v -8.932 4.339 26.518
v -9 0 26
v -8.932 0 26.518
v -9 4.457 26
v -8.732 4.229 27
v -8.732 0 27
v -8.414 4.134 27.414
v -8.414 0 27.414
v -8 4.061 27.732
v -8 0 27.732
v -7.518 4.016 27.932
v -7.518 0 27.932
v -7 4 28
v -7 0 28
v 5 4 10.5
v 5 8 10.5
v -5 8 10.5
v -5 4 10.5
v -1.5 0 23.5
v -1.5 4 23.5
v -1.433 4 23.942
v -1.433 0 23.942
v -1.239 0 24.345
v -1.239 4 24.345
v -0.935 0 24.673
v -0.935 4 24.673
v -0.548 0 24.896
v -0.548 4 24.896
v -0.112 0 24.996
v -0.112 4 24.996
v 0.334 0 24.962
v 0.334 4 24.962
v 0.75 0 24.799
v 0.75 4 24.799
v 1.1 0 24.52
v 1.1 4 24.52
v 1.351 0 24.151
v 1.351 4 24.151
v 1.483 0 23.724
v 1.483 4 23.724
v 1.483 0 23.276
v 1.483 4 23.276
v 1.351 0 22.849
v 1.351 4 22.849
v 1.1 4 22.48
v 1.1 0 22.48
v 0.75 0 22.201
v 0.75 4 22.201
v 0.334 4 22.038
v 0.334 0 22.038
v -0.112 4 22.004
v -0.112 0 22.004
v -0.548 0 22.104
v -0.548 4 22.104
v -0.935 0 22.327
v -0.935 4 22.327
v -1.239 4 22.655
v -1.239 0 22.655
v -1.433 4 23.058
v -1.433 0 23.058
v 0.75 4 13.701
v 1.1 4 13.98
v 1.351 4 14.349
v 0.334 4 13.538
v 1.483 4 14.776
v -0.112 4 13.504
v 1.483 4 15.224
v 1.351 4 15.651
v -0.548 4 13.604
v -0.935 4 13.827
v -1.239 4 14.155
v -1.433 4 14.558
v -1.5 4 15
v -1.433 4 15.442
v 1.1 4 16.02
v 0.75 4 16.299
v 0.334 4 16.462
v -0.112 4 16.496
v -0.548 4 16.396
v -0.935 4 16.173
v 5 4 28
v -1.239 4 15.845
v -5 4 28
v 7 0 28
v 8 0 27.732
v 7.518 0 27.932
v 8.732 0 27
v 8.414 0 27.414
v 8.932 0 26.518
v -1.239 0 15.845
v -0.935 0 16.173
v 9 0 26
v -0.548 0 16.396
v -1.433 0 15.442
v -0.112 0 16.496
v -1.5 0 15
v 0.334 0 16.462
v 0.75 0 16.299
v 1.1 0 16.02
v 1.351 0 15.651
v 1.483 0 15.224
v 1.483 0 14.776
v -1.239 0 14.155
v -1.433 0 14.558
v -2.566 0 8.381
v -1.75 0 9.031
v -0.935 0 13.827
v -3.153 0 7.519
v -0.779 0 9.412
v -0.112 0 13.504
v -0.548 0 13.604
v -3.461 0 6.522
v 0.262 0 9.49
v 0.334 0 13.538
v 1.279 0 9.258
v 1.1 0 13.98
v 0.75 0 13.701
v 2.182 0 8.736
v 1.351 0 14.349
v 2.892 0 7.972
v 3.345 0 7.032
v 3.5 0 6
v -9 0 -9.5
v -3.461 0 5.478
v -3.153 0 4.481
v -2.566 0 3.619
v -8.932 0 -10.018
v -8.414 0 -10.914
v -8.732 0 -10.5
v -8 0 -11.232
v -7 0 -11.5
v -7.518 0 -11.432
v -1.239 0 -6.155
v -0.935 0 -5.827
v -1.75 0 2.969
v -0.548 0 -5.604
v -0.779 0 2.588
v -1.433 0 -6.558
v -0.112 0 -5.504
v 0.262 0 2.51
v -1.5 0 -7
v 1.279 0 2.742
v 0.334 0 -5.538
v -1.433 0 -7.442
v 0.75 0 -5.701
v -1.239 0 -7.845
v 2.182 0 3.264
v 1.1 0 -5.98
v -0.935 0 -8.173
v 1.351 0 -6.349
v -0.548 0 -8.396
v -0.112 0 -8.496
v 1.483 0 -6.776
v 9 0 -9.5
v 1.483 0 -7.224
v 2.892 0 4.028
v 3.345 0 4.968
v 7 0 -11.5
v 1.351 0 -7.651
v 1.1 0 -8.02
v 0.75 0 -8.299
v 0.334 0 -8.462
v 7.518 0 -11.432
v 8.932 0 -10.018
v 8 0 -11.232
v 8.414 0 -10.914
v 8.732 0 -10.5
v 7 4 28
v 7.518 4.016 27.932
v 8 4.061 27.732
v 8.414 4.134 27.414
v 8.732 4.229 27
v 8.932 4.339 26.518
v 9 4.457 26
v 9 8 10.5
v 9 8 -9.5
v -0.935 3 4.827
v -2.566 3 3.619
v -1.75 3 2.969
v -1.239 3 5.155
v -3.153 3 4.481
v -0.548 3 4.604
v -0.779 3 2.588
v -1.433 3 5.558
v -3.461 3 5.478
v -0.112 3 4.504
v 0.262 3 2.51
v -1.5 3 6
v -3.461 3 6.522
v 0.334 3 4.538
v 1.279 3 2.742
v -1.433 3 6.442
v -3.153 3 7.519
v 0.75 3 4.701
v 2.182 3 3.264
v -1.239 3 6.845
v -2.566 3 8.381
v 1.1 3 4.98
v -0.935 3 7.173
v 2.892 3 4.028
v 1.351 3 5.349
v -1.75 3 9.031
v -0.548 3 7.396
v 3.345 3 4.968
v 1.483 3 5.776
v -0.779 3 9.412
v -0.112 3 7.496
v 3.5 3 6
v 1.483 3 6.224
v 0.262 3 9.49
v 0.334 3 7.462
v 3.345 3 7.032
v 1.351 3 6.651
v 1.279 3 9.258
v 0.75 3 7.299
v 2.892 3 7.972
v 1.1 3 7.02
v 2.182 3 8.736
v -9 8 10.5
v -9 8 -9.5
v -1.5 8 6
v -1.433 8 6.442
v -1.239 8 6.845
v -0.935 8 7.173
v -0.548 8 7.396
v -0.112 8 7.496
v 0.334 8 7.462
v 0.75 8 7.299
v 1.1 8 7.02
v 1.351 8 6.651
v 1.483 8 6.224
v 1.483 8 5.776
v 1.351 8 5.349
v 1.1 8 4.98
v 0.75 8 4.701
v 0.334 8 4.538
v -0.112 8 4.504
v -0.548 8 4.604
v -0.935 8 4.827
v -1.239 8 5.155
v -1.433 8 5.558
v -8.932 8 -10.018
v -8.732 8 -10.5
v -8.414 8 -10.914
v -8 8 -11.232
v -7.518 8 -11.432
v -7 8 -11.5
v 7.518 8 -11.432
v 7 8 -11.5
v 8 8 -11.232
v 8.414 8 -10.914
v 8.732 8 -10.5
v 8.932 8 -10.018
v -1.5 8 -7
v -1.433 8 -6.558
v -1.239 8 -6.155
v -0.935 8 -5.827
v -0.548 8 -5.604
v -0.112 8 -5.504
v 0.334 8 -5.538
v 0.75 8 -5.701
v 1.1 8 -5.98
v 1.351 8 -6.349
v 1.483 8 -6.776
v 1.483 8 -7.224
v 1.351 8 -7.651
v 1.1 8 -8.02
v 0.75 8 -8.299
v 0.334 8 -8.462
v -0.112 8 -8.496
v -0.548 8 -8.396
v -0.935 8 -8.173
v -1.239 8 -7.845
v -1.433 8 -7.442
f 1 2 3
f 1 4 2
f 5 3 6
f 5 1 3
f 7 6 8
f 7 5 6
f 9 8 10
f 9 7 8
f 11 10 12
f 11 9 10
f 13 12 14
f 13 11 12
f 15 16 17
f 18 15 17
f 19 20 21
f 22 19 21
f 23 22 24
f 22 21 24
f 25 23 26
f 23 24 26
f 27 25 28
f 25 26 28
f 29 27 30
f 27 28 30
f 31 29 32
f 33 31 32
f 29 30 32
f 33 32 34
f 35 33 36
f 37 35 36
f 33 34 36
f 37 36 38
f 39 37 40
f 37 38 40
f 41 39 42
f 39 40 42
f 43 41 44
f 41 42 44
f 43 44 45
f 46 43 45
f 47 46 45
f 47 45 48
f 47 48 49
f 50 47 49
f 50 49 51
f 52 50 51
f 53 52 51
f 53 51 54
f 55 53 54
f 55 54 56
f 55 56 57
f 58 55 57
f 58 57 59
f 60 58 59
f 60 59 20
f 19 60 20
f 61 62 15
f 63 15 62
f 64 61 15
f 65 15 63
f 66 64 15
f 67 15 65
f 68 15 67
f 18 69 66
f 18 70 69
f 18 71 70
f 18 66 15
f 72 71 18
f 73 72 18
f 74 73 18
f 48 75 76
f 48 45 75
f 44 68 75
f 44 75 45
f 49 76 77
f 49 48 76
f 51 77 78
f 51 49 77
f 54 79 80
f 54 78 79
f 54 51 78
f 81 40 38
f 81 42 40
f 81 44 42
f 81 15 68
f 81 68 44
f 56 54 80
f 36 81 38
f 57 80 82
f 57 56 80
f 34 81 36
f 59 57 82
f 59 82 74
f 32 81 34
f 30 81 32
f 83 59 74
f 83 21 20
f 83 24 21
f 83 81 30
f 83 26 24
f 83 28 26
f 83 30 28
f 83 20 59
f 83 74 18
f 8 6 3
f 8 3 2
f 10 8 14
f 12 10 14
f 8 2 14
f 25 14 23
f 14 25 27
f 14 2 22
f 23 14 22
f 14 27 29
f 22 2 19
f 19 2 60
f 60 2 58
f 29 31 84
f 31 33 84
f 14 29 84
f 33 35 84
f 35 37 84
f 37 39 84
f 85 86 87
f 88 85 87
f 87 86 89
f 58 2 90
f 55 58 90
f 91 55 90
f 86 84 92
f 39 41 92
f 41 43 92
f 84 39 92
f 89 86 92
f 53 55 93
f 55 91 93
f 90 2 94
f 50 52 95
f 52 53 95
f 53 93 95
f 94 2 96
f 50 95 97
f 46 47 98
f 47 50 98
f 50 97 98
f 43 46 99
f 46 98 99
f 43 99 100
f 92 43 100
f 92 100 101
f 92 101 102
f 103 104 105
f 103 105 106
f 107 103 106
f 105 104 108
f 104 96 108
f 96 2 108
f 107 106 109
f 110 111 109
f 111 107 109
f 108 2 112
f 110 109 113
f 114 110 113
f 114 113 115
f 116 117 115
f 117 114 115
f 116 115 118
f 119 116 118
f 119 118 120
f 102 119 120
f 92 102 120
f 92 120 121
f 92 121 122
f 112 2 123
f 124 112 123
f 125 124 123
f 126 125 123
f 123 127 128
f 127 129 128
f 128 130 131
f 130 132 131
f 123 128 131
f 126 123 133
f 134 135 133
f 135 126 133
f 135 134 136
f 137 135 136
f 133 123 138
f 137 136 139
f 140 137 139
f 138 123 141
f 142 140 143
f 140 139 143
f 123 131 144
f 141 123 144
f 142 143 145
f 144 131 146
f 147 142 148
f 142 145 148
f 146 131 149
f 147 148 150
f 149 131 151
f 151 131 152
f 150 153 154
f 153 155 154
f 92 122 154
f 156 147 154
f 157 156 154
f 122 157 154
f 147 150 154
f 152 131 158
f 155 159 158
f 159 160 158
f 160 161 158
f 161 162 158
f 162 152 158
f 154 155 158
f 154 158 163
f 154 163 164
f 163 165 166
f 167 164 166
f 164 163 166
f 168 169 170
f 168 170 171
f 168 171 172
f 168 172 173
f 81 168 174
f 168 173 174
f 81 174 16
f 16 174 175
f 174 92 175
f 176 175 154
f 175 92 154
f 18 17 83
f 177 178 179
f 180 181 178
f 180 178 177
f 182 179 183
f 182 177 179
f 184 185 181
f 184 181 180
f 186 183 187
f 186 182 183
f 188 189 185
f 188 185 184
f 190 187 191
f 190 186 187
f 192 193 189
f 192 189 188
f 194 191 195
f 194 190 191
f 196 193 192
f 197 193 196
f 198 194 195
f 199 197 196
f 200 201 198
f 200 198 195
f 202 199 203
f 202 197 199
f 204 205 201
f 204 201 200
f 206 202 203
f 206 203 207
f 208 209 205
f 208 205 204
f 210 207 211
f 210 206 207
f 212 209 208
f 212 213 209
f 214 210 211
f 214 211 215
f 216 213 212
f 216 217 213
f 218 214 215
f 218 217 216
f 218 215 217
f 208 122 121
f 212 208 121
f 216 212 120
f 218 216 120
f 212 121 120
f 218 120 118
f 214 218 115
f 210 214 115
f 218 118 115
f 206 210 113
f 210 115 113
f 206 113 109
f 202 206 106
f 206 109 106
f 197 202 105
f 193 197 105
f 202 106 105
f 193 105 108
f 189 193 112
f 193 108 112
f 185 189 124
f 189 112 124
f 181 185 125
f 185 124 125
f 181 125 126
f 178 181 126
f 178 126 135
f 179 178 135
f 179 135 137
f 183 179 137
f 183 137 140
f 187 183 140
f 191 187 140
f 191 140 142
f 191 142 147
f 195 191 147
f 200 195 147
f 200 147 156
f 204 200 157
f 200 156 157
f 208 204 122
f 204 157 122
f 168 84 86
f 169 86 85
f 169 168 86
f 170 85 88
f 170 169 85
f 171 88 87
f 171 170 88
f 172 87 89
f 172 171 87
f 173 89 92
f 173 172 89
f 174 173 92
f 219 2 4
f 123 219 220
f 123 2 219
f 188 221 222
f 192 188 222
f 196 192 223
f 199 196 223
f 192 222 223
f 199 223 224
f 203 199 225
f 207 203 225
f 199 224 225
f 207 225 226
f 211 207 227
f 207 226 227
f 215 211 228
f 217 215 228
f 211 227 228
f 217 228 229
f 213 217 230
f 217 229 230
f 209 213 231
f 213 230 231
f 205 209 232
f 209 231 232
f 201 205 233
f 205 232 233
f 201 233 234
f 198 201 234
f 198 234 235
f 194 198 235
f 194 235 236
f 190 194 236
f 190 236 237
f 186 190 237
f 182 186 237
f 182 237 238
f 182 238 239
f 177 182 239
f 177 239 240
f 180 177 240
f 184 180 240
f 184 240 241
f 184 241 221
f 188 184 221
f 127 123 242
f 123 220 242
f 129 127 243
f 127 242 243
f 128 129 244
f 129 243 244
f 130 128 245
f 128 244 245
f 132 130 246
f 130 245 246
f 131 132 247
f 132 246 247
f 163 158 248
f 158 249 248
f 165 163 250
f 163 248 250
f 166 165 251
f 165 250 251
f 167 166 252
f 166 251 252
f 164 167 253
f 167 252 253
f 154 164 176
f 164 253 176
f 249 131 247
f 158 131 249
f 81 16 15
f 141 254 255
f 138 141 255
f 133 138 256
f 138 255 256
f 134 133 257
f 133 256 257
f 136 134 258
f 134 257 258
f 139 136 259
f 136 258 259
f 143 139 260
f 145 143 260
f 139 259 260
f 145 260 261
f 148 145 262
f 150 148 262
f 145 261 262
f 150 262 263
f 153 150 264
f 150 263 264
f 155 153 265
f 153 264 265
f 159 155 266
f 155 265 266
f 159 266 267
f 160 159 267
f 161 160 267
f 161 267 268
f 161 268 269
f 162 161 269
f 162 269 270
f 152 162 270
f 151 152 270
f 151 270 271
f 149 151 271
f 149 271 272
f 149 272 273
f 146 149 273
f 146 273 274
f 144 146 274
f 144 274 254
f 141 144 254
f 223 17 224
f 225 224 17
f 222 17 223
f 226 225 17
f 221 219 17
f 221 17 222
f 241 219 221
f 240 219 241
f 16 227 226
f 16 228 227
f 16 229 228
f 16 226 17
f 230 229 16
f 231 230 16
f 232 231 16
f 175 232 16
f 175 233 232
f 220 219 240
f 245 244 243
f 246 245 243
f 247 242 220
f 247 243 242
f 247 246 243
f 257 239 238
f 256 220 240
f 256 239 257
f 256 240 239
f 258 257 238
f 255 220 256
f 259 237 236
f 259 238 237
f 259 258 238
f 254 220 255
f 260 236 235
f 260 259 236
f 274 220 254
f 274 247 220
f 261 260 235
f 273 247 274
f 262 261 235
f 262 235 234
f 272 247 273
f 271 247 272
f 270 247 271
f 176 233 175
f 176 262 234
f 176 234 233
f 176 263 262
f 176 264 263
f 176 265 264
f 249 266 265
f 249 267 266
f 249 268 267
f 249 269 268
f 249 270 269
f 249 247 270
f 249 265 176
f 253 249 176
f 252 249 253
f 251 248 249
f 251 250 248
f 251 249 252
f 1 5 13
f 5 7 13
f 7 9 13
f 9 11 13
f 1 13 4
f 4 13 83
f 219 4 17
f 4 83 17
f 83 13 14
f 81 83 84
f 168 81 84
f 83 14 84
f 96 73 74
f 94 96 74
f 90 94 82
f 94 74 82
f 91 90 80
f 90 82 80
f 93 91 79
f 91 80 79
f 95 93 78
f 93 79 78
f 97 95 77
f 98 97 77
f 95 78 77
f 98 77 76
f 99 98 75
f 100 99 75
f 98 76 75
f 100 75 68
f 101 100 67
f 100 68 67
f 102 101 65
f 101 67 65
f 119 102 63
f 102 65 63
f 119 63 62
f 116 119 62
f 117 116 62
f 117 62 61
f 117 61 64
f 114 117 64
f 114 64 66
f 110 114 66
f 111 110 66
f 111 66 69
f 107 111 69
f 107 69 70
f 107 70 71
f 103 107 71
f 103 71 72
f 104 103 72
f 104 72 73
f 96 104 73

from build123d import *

# Parameters (mm, degrees)
SKETCH1_W      = 18
SKETCH1_H      = 39.5
EXTRUDE1_DEPTH = 8
SKETCH4_W      = 10
SKETCH4_H      = 17.5
EXTRUDE3_DEPTH = 4
EXTRUDE4_DEPTH = 19
SKETCH4_4_R    = 1.5
EXTRUDE5_DEPTH = 9
FILLET1_R      = 2
SKETCH8_R      = 1.5
EXTRUDE6_DEPTH = 5
SKETCH9_R      = 3.5
EXTRUDE7_DEPTH = 3
FILLET2_R      = 2


with BuildPart() as part:
    # Sketch1 → Extrude1 (new body)
    with BuildSketch(Plane(origin=(0, 0, 0), x_dir=(1, 0, 0), z_dir=(0, 1, 0))):
        with Locations((0, -8.25)):
            Rectangle(SKETCH1_W, SKETCH1_H)
    extrude(amount=EXTRUDE1_DEPTH)

    # Sketch4 → Extrude3 (cut)
    with BuildSketch(Plane(origin=(0, 8, 0), x_dir=(-1, 0, 0), z_dir=(0, 1, 0))):
        with Locations((0, 19.25)):
            Rectangle(SKETCH4_W, SKETCH4_H)
    extrude(amount=-EXTRUDE3_DEPTH, mode=Mode.SUBTRACT)

    # Sketch7 → Extrude4 (cut, through all)
    with BuildSketch(Plane(origin=(9, 0, 0), x_dir=(0, 0, -1), z_dir=(1, 0, 0))):
        Polygon((-28, 4), (-10.5, 8), (-28, 8), align=None)
    extrude(amount=-EXTRUDE4_DEPTH, mode=Mode.SUBTRACT)

    # Sketch4<4> → Extrude5 (cut, through all)
    with BuildSketch(Plane(origin=(0, 8, 0), x_dir=(-1, 0, 0), z_dir=(0, 1, 0))):
        with Locations((0, 6)):
            Circle(SKETCH4_4_R)
        with Locations((0, -7)):
            Circle(SKETCH4_4_R)
    extrude(amount=-EXTRUDE5_DEPTH, mode=Mode.SUBTRACT)

    # Fillet1
    fillet1_edges = [part.edges().sort_by_distance(p)[0] for p in [
        (9, 2, 28),
        (-9, 2, 28),
    ]]
    fillet(fillet1_edges, radius=FILLET1_R)

    # Sketch8 → Extrude6 (cut, through all)
    with BuildSketch(Plane(origin=(0, 4, 0), x_dir=(-1, 0, 0), z_dir=(0, 1, 0))):
        with Locations((0, 15)):
            Circle(SKETCH8_R)
        with Locations((0, 23.5)):
            Circle(SKETCH8_R)
    extrude(amount=-EXTRUDE6_DEPTH, mode=Mode.SUBTRACT)

    # Sketch9 → Extrude7 (cut)
    with BuildSketch(Plane.XZ):
        with Locations((0, 6)):
            Circle(SKETCH9_R)
    extrude(amount=-EXTRUDE7_DEPTH, mode=Mode.SUBTRACT)

    # Fillet2
    fillet2_edges = [part.edges().sort_by_distance(p)[0] for p in [
        (-9, 4, -11.5),
        (9, 4, -11.5),
    ]]
    fillet(fillet2_edges, radius=FILLET2_R)


solid = part.part
